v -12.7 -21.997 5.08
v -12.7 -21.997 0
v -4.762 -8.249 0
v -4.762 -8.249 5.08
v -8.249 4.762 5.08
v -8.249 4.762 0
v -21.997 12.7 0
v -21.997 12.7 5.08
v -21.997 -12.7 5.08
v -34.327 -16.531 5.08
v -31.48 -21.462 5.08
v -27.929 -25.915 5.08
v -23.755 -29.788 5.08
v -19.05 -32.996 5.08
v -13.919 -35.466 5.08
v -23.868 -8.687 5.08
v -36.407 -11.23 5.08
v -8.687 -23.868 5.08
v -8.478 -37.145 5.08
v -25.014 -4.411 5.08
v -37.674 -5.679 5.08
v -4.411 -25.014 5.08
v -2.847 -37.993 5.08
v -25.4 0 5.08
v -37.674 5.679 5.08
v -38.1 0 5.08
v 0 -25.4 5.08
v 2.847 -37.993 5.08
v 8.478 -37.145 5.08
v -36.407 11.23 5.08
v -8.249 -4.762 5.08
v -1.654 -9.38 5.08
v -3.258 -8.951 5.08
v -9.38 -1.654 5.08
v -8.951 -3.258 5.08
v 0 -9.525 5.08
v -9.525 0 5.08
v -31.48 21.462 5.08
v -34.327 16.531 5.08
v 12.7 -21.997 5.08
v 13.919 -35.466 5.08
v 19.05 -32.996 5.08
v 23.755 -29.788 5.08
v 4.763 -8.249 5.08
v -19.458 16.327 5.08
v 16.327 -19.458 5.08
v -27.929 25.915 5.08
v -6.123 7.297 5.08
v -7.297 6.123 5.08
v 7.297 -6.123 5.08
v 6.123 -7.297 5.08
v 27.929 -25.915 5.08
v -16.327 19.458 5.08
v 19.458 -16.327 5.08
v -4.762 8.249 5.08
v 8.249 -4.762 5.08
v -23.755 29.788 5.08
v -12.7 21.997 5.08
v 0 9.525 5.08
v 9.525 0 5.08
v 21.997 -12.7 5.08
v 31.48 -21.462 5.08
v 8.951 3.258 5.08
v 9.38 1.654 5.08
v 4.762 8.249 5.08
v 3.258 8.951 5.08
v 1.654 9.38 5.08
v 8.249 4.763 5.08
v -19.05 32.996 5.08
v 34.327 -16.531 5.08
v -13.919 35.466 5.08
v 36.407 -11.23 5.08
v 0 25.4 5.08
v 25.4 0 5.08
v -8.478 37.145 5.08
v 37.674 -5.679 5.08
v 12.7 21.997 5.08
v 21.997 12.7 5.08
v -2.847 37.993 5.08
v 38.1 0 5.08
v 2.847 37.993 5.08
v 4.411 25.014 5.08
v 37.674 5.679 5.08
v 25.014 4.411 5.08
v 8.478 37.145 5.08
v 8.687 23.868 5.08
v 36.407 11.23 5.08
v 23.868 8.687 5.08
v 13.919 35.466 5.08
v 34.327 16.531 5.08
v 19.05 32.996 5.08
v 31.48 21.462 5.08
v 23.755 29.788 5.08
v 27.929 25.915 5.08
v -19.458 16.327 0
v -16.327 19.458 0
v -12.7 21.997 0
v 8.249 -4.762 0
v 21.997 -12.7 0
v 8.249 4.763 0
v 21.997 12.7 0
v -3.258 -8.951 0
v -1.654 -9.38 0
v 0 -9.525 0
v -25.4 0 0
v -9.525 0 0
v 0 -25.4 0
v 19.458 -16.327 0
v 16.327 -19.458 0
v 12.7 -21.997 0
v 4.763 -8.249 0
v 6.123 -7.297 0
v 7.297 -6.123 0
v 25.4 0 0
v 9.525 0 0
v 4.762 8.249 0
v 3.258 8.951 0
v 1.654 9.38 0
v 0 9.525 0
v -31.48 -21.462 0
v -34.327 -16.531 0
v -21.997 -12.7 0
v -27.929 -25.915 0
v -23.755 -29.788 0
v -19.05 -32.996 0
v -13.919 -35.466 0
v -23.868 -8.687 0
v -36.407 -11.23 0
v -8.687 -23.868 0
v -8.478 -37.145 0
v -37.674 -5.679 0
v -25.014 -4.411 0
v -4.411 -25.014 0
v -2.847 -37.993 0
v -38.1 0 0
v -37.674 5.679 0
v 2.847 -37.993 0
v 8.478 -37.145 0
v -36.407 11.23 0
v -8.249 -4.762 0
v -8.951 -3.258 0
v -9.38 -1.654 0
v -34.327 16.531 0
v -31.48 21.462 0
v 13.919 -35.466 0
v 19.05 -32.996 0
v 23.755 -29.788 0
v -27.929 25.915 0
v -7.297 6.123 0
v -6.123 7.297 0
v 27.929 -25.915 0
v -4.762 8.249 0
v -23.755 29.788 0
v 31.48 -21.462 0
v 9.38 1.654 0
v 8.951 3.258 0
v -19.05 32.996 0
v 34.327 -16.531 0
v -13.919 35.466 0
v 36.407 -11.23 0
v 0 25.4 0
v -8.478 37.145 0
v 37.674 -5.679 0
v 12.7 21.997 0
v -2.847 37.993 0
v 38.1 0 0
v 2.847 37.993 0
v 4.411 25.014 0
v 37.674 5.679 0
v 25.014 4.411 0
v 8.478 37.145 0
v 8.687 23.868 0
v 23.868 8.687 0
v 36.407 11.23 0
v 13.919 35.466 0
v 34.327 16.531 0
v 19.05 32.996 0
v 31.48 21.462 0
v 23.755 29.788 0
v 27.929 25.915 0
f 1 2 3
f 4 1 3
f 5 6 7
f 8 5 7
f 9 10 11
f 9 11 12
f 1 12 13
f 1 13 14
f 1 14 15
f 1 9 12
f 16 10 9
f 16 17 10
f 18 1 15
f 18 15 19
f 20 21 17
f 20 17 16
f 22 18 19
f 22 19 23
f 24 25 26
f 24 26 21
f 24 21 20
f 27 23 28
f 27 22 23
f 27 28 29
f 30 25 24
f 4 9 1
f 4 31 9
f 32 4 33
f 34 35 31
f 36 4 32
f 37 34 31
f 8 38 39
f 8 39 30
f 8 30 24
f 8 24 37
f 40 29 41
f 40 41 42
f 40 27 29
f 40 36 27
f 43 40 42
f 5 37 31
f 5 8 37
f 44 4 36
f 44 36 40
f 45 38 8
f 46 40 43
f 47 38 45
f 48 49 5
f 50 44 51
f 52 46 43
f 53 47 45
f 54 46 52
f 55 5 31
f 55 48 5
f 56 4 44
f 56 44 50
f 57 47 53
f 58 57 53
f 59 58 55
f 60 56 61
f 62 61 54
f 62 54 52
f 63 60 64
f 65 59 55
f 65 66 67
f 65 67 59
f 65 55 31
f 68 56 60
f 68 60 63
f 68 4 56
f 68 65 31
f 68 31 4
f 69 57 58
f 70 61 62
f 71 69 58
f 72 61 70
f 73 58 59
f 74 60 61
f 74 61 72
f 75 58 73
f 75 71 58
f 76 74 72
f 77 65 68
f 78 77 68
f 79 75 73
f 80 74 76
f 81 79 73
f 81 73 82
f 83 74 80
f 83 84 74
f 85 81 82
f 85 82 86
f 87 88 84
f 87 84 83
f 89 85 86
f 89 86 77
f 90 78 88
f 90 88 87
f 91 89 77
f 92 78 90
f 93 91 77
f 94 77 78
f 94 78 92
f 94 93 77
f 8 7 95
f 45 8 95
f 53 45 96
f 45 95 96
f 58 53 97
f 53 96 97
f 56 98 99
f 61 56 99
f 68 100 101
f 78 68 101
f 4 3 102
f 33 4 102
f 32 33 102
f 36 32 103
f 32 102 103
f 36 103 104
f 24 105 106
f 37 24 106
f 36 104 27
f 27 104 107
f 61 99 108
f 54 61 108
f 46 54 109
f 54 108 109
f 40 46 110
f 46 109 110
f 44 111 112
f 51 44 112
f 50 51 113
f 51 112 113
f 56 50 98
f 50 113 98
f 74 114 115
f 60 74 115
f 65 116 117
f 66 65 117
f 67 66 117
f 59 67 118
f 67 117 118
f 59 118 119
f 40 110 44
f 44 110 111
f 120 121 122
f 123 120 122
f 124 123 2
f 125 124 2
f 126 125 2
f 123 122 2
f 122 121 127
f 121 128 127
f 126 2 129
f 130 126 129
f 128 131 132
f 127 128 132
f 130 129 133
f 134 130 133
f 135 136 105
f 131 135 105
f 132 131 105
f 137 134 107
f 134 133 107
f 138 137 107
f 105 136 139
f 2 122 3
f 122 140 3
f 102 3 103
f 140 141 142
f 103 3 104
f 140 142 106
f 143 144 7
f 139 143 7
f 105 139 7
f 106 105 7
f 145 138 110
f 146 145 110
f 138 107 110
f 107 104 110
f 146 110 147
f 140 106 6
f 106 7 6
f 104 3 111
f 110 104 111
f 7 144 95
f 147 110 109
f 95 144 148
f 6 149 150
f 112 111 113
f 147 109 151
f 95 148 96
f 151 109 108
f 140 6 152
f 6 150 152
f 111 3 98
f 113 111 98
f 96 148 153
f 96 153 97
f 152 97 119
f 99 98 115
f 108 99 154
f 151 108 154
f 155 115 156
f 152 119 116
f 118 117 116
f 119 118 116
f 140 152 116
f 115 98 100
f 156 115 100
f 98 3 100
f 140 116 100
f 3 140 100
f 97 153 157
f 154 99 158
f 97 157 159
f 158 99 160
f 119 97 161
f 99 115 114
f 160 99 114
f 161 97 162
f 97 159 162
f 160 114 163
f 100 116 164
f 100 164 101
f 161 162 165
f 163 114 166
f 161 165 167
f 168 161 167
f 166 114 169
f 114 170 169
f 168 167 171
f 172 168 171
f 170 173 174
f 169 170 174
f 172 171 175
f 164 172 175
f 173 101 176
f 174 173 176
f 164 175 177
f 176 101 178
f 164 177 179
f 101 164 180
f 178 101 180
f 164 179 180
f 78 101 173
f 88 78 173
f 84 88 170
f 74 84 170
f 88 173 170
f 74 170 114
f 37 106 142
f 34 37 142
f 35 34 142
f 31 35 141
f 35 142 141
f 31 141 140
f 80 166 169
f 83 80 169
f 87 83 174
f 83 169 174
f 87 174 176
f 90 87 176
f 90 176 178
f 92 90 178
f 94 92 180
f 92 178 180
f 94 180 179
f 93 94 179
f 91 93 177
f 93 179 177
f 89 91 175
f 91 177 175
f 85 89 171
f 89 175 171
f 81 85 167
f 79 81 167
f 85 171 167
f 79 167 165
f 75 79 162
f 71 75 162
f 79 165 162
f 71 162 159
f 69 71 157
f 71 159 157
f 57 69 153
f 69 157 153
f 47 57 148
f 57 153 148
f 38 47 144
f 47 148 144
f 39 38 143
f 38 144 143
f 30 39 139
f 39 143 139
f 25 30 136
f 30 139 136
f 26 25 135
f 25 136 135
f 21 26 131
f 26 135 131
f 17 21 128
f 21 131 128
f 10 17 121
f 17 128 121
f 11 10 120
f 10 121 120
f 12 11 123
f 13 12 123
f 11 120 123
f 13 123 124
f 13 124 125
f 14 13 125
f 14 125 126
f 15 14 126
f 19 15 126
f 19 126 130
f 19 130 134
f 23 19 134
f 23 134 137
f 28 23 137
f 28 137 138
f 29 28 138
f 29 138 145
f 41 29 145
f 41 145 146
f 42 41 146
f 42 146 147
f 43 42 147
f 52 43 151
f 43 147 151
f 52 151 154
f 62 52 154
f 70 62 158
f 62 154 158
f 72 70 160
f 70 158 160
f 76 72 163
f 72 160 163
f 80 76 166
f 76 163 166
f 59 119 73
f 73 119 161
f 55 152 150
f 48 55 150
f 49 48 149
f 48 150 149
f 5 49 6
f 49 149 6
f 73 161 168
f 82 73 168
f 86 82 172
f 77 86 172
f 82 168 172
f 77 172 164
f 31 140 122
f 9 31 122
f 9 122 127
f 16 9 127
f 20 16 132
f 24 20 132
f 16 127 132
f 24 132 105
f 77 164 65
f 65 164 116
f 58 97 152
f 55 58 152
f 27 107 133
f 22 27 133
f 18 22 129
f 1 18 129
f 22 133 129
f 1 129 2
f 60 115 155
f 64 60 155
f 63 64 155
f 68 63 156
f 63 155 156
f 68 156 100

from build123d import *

# Parameters (mm, degrees)
F0_R     = 38.1
F1_DEPTH = 5.08


with BuildPart() as f1:
    # F0 (on Top) → F1 (new body)
    with BuildSketch(Plane.XY):
        Circle(F0_R)
        with BuildLine():
            ThreePointArc((21.9970452561, 12.7), (24.5345159877, 6.5740037456), (25.4, 0))
            ThreePointArc((25.4, 0), (24.5345159877, -6.5740037456), (21.9970452561, -12.7))
            ThreePointArc((21.9970452561, -12.7), (17.9605122421, -17.9605122421), (12.7, -21.9970452561))
            ThreePointArc((12.7, -21.9970452561), (6.5740037456, -24.5345159877), (0, -25.4))
            ThreePointArc((0, -25.4), (-6.5740037456, -24.5345159877), (-12.7, -21.9970452561))
            ThreePointArc((-12.7, -21.9970452561), (-17.9605122421, -17.9605122421), (-21.9970452561, -12.7))
            ThreePointArc((-21.9970452561, -12.7), (-24.5345159877, -6.5740037456), (-25.4, 0))
            ThreePointArc((-25.4, 0), (-24.5345159877, 6.5740037456), (-21.9970452561, 12.7))
            ThreePointArc((-21.9970452561, 12.7), (-17.9605122421, 17.9605122421), (-12.7, 21.9970452561))
            ThreePointArc((-12.7, 21.9970452561), (-6.5740037456, 24.5345159877), (0, 25.4))
            ThreePointArc((0, 25.4), (6.5740037456, 24.5345159877), (12.7, 21.9970452561))
            ThreePointArc((12.7, 21.9970452561), (17.9605122421, 17.9605122421), (21.9970452561, 12.7))
        make_face(mode=Mode.SUBTRACT)
        with BuildLine():
            Line((-8.248891971, -4.7625), (0, 0))
            Line((0, 0), (-9.525, 0))
            ThreePointArc((-9.525, 0), (-9.2004434954, -2.4652514046), (-8.248891971, -4.7625))
        make_face()
        with BuildLine():
            Line((-4.7625, -8.248891971), (0, 0))
            Line((0, 0), (-8.248891971, -4.7625))
            ThreePointArc((-8.248891971, -4.7625), (-6.7351920908, -6.7351920908), (-4.7625, -8.248891971))
        make_face()
        with BuildLine():
            Line((0, -9.525), (0, 0))
            Line((0, 0), (-4.7625, -8.248891971))
            ThreePointArc((-4.7625, -8.248891971), (-2.4652514046, -9.2004434954), (0, -9.525))
        make_face()
        with BuildLine():
            Line((4.7625, -8.248891971), (0, 0))
            Line((0, 0), (0, -9.525))
            ThreePointArc((0, -9.525), (2.4652514046, -9.2004434954), (4.7625, -8.248891971))
        make_face()
        with BuildLine():
            ThreePointArc((4.7625, -8.248891971), (6.7351920908, -6.7351920908), (8.248891971, -4.7625))
            Line((8.248891971, -4.7625), (0, 0))
            Line((0, 0), (4.7625, -8.248891971))
        make_face()
        with BuildLine():
            ThreePointArc((8.248891971, -4.7625), (9.2004434954, -2.4652514046), (9.525, 0))
            Line((9.525, 0), (0, 0))
            Line((0, 0), (8.248891971, -4.7625))
        make_face()
        with BuildLine():
            Line((0, 0), (9.525, 0))
            ThreePointArc((9.525, 0), (9.2004434954, 2.4652514046), (8.248891971, 4.7625))
            Line((8.248891971, 4.7625), (0, 0))
        make_face()
        with BuildLine():
            Line((0, 0), (8.248891971, 4.7625))
            ThreePointArc((8.248891971, 4.7625), (6.7351920908, 6.7351920908), (4.7625, 8.248891971))
            Line((4.7625, 8.248891971), (0, 0))
        make_face()
        with BuildLine():
            Line((0, 9.525), (0, 0))
            Line((0, 0), (4.7625, 8.248891971))
            ThreePointArc((4.7625, 8.248891971), (2.4652514046, 9.2004434954), (0, 9.525))
        make_face()
        with BuildLine():
            Line((-4.7625, 8.248891971), (0, 0))
            Line((0, 0), (0, 9.525))
            ThreePointArc((0, 9.525), (-2.4652514046, 9.2004434954), (-4.7625, 8.248891971))
        make_face()
        with BuildLine():
            Line((-8.248891971, 4.7625), (0, 0))
            Line((0, 0), (-4.7625, 8.248891971))
            ThreePointArc((-4.7625, 8.248891971), (-6.7351920908, 6.7351920908), (-8.248891971, 4.7625))
        make_face()
        with BuildLine():
            Line((-9.525, 0), (0, 0))
            Line((0, 0), (-8.248891971, 4.7625))
            ThreePointArc((-8.248891971, 4.7625), (-9.2004434954, 2.4652514046), (-9.525, 0))
        make_face()
        with BuildLine():
            ThreePointArc((-9.525, 0), (-9.2004434954, 2.4652514046), (-8.248891971, 4.7625))
            Line((-8.248891971, 4.7625), (-21.9970452561, 12.7))
            ThreePointArc((-21.9970452561, 12.7), (-24.5345159877, 6.5740037456), (-25.4, 0))
            Line((-25.4, 0), (-9.525, 0))
        make_face()
        with BuildLine():
            Line((0, 9.525), (0, 25.4))
            ThreePointArc((0, 25.4), (-6.5740037456, 24.5345159877), (-12.7, 21.9970452561))
            Line((-12.7, 21.9970452561), (-4.7625, 8.248891971))
            ThreePointArc((-4.7625, 8.248891971), (-2.4652514046, 9.2004434954), (0, 9.525))
        make_face()
        with BuildLine():
            Line((8.248891971, 4.7625), (21.9970452561, 12.7))
            ThreePointArc((21.9970452561, 12.7), (17.9605122421, 17.9605122421), (12.7, 21.9970452561))
            Line((12.7, 21.9970452561), (4.7625, 8.248891971))
            ThreePointArc((4.7625, 8.248891971), (6.7351920908, 6.7351920908), (8.248891971, 4.7625))
        make_face()
        with BuildLine():
            ThreePointArc((21.9970452561, -12.7), (24.5345159877, -6.5740037456), (25.4, 0))
            Line((25.4, 0), (9.525, 0))
            ThreePointArc((9.525, 0), (9.2004434954, -2.4652514046), (8.248891971, -4.7625))
            Line((8.248891971, -4.7625), (21.9970452561, -12.7))
        make_face()
        with BuildLine():
            ThreePointArc((0, -25.4), (6.5740037456, -24.5345159877), (12.7, -21.9970452561))
            Line((12.7, -21.9970452561), (4.7625, -8.248891971))
            ThreePointArc((4.7625, -8.248891971), (2.4652514046, -9.2004434954), (0, -9.525))
            Line((0, -9.525), (0, -25.4))
        make_face()
        with BuildLine():
            ThreePointArc((-4.7625, -8.248891971), (-6.7351920908, -6.7351920908), (-8.248891971, -4.7625))
            Line((-8.248891971, -4.7625), (-21.9970452561, -12.7))
            ThreePointArc((-21.9970452561, -12.7), (-17.9605122421, -17.9605122421), (-12.7, -21.9970452561))
            Line((-12.7, -21.9970452561), (-4.7625, -8.248891971))
        make_face()
    extrude(amount=F1_DEPTH)


solid = f1.part
